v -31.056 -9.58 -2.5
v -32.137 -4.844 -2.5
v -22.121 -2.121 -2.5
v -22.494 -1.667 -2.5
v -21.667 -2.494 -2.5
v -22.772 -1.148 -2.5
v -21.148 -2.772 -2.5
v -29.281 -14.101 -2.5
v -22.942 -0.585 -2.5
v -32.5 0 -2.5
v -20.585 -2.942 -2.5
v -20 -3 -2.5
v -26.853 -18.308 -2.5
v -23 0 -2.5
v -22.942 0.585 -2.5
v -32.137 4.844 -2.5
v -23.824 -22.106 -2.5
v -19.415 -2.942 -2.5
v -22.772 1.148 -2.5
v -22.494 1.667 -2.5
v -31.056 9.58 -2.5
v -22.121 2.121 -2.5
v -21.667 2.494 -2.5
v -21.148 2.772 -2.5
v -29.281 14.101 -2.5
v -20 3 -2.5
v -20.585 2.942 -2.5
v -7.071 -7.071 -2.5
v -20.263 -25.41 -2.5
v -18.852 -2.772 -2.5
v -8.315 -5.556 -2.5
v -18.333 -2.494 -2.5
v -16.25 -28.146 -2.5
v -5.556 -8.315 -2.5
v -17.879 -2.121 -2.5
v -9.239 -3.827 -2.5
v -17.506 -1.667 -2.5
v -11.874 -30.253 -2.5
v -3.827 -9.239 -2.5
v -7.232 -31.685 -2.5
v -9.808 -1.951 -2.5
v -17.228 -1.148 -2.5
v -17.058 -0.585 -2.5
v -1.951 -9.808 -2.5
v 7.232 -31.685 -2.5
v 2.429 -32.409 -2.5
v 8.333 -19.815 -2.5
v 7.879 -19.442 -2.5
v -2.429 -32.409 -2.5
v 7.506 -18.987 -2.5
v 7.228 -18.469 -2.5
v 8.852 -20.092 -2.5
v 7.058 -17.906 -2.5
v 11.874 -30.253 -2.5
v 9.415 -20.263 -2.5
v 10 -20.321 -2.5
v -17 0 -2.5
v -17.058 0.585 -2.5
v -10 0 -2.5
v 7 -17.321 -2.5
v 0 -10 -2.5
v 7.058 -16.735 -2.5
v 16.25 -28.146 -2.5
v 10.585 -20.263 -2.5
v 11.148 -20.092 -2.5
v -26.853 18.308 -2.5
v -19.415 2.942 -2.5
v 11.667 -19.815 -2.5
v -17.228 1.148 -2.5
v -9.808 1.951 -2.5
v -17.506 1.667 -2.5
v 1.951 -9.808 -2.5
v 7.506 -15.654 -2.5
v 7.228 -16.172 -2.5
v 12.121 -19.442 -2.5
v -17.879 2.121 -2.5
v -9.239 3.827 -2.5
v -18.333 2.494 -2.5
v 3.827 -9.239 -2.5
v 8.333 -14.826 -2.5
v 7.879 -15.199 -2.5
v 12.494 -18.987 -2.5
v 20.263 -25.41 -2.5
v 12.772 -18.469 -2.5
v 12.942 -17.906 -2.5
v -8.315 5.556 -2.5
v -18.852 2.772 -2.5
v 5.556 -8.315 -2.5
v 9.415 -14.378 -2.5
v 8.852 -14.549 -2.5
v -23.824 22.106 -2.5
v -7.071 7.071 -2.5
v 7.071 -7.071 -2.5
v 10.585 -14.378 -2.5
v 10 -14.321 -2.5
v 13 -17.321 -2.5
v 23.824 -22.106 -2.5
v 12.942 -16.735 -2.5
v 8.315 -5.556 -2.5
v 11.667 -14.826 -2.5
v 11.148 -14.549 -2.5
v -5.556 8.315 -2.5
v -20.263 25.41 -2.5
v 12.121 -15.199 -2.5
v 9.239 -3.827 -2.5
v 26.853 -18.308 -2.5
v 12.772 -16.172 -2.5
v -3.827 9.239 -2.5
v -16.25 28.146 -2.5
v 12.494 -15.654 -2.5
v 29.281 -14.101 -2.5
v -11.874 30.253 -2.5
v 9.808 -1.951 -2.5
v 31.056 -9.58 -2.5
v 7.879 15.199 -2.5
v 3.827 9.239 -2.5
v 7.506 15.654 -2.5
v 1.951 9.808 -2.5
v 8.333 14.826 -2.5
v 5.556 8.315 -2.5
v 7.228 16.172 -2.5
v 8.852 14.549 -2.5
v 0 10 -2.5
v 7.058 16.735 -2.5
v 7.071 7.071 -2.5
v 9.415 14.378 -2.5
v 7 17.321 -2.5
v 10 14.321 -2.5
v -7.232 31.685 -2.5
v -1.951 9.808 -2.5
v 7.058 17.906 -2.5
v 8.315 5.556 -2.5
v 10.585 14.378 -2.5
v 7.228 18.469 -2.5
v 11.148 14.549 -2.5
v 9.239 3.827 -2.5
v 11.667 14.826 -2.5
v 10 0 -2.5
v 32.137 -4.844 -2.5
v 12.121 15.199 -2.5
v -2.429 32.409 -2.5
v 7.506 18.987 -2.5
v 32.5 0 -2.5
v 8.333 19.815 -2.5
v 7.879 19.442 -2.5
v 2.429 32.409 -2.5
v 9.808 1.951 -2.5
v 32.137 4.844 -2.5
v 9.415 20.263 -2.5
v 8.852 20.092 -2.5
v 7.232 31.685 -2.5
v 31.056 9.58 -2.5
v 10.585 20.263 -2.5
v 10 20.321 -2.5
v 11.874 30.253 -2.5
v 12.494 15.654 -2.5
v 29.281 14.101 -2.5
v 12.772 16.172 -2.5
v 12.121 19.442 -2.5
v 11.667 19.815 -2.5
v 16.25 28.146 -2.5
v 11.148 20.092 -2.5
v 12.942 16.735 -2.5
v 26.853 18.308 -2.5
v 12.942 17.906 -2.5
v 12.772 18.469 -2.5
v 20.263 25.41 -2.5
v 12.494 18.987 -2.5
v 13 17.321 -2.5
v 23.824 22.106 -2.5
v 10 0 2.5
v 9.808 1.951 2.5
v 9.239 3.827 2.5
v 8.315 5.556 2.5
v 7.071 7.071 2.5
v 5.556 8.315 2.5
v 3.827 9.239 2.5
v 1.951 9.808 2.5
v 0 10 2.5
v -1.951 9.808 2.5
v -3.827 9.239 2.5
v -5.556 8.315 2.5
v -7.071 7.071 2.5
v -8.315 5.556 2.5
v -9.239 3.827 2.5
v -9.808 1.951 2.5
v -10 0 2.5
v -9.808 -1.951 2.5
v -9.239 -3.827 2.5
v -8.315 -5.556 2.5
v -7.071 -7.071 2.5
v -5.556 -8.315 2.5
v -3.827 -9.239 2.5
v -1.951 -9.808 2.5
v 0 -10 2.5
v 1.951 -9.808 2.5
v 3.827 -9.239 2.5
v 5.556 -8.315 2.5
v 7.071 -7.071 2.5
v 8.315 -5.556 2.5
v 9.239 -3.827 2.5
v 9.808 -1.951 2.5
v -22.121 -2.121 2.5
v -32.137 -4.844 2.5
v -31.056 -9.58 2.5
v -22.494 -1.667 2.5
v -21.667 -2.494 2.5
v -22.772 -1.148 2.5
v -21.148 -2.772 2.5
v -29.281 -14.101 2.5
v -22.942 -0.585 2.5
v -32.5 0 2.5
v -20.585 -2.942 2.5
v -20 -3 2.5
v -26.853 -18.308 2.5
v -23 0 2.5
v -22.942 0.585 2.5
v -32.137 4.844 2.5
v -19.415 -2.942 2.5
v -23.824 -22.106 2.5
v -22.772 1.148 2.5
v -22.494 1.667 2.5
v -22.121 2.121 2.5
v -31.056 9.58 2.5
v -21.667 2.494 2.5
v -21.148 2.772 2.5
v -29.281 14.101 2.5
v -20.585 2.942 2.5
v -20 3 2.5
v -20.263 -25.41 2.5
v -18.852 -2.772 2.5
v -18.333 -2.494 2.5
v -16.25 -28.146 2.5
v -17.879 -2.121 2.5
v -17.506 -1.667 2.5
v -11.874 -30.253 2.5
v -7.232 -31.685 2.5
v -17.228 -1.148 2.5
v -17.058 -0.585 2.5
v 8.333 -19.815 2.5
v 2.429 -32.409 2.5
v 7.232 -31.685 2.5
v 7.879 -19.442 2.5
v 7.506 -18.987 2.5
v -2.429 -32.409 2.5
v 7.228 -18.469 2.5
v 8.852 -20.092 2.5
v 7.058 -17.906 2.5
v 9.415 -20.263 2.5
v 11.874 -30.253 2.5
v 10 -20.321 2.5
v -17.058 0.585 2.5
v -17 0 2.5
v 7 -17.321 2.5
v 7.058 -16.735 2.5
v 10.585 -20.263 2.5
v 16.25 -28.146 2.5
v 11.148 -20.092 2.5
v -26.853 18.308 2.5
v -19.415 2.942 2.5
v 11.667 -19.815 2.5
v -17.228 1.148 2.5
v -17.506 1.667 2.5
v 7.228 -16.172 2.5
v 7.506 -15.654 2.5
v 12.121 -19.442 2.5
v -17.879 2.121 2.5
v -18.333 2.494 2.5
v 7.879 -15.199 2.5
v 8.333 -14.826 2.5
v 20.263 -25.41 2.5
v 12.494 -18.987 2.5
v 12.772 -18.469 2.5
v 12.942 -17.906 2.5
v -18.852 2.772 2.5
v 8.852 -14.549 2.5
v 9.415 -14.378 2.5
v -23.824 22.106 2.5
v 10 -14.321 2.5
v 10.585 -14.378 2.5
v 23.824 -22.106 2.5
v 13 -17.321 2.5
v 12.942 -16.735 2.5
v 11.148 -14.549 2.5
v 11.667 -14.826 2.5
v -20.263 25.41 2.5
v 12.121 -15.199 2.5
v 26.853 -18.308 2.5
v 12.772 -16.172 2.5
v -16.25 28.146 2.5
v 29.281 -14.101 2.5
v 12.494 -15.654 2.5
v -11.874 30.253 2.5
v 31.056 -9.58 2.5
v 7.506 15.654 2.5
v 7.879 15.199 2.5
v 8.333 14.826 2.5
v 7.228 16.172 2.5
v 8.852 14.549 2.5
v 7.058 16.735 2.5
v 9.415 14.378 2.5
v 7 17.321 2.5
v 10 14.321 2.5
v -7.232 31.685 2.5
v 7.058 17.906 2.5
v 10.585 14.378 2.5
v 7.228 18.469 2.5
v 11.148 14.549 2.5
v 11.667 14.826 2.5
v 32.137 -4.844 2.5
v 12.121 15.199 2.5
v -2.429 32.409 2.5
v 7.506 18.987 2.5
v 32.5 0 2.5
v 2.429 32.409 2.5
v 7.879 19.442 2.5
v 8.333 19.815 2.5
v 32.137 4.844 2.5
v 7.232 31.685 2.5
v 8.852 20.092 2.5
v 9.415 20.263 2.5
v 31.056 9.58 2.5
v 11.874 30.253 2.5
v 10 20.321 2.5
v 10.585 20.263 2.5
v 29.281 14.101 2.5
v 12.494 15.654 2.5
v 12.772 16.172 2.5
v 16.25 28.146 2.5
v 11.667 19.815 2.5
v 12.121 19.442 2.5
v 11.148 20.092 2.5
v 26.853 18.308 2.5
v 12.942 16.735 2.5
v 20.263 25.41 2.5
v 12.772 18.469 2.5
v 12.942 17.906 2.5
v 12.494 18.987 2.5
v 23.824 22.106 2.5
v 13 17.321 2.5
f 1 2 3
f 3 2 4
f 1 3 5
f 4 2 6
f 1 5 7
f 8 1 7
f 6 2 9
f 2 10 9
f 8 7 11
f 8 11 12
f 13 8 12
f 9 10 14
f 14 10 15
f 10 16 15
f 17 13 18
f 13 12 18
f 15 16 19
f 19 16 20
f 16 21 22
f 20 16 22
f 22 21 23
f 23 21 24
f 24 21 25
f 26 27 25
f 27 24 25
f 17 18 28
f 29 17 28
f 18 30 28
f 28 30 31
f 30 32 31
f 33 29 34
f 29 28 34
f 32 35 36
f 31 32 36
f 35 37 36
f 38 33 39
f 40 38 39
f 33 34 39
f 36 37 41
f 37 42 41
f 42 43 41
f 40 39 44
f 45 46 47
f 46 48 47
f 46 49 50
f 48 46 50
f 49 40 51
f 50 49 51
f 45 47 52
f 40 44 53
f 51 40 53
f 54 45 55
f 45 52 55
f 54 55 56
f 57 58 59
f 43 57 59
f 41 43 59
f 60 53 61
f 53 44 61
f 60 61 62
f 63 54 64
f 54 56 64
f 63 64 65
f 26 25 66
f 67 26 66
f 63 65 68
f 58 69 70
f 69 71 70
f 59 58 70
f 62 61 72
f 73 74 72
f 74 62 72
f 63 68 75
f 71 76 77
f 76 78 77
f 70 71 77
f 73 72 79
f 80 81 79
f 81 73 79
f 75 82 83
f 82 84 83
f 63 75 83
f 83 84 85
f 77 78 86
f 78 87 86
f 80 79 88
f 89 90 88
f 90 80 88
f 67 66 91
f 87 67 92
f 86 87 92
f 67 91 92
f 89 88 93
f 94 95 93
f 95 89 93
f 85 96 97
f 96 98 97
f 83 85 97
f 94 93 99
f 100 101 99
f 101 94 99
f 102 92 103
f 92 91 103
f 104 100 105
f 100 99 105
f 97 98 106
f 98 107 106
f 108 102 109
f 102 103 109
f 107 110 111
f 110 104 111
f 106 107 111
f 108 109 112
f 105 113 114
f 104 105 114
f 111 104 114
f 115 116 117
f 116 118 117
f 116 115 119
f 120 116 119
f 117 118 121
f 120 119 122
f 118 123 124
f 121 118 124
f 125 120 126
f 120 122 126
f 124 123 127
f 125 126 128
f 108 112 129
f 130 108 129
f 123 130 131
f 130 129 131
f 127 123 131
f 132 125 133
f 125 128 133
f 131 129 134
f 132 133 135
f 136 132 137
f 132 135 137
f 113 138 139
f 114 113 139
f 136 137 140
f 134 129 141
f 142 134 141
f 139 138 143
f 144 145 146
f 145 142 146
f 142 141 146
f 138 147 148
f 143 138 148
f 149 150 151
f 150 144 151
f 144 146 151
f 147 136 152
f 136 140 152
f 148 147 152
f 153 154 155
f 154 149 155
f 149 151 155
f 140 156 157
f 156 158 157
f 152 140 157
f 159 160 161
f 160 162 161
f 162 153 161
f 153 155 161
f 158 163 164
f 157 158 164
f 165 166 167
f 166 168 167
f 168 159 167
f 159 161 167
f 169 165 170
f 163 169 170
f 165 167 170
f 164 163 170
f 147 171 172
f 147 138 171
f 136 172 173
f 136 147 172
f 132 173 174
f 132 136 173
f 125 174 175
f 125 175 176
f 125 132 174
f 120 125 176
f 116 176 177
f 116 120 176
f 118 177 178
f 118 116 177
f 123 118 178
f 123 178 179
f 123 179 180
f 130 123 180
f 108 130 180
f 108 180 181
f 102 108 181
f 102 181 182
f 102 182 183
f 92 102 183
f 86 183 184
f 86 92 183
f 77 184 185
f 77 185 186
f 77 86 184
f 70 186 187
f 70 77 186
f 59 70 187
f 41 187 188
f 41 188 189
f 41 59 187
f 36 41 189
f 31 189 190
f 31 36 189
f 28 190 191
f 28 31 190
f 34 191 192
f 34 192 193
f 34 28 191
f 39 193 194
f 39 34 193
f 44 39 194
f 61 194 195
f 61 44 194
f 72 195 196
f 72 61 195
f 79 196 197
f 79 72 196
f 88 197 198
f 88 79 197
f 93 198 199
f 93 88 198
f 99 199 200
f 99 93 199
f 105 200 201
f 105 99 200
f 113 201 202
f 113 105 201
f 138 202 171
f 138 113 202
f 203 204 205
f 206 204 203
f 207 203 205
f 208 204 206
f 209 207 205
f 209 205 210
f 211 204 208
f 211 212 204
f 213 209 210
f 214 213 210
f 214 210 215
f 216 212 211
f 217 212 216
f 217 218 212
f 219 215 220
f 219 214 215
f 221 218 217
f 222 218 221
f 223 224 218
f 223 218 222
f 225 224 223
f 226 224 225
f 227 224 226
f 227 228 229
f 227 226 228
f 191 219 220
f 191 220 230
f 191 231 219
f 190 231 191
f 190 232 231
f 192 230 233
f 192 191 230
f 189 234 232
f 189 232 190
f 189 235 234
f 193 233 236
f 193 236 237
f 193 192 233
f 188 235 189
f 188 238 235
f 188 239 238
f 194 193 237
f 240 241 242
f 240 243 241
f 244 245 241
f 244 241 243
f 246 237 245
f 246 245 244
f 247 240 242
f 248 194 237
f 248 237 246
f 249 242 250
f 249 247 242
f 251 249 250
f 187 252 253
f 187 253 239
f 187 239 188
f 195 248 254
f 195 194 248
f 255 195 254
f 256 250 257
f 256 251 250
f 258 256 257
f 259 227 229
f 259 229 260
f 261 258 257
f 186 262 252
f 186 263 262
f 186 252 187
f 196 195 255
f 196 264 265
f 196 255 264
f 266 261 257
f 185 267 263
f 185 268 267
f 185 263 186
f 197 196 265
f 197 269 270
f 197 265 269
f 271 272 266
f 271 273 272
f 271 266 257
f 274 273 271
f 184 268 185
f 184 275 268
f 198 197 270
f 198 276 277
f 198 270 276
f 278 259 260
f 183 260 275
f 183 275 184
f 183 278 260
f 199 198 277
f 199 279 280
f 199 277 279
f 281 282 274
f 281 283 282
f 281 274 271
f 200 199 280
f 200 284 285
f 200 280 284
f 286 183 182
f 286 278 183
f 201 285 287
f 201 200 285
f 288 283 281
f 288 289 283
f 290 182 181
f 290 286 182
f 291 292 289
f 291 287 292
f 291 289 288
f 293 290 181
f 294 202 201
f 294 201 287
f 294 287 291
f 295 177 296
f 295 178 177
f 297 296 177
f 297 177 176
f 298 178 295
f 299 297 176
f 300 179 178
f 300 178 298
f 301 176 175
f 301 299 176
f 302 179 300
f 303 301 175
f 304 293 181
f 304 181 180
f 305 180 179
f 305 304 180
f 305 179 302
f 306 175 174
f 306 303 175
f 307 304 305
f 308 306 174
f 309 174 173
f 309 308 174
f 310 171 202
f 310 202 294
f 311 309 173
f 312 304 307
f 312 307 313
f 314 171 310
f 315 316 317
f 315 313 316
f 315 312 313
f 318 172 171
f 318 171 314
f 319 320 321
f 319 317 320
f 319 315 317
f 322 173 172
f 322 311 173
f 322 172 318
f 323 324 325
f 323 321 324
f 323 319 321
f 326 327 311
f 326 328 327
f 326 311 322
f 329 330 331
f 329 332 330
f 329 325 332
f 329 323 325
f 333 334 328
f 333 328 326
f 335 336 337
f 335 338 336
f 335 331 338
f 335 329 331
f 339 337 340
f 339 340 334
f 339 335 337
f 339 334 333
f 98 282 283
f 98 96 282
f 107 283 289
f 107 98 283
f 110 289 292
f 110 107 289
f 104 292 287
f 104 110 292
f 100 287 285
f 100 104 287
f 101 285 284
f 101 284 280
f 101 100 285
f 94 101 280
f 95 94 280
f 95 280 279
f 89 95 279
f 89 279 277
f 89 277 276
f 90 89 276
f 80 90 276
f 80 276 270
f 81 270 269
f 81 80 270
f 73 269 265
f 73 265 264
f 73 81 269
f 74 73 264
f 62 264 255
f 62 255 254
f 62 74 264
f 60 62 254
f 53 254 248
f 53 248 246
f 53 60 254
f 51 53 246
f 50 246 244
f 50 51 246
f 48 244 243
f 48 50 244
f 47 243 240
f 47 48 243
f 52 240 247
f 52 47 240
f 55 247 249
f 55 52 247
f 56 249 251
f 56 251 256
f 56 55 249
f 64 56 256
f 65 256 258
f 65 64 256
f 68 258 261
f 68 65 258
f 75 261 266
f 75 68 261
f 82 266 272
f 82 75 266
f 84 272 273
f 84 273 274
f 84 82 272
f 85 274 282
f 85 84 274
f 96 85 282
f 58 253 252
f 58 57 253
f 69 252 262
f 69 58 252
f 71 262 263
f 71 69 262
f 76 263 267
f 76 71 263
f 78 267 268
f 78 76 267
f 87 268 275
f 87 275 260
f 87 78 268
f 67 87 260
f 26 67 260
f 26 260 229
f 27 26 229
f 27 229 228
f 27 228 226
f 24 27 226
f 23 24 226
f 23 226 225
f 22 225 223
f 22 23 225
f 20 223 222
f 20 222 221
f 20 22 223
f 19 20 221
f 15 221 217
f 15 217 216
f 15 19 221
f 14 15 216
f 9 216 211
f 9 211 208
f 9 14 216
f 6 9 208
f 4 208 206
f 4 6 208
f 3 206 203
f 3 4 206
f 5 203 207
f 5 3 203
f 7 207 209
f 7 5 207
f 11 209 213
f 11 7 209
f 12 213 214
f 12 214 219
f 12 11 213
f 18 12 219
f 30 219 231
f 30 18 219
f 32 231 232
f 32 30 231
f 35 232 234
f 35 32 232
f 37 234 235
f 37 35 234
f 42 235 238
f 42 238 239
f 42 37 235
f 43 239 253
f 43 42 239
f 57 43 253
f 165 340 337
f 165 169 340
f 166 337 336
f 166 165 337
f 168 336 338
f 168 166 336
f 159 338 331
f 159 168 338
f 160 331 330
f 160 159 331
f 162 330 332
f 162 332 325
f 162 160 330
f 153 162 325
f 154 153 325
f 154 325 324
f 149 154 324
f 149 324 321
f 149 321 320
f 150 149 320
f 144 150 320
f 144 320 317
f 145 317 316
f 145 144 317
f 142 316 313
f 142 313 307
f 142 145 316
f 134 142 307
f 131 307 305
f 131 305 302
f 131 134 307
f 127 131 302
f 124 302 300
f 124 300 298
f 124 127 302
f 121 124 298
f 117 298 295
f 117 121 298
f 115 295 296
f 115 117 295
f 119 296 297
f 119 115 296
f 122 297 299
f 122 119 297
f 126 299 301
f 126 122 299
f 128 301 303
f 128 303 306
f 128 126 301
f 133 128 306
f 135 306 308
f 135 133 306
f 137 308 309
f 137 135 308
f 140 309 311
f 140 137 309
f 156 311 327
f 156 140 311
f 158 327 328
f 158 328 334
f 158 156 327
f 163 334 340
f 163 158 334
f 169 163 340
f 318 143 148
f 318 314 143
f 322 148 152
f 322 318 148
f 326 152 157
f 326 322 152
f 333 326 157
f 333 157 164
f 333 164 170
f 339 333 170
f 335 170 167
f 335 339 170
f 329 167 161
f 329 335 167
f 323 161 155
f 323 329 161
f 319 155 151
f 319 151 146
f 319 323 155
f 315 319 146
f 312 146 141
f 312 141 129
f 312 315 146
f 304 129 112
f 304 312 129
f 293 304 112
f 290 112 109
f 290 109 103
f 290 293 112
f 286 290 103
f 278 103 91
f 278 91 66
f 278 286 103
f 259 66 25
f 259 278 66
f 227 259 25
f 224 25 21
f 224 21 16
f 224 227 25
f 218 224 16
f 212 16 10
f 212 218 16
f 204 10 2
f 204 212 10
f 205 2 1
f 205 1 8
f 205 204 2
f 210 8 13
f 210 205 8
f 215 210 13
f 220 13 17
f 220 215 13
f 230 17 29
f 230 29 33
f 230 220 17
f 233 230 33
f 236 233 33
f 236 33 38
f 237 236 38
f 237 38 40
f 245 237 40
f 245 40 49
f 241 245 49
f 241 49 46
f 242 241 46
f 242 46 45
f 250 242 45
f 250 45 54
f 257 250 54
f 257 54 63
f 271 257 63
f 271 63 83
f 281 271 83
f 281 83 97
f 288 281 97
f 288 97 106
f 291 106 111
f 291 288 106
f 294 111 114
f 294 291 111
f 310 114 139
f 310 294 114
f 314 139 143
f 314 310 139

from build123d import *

# Parameters (mm, degrees)
SKETCH1_R           = 32.5
SKETCH1_R_2         = 10
SKETCH1_R_3         = 3
BOSS_EXTRUDE1_DEPTH = 2.5


with BuildPart() as part:
    # Sketch1 → Boss-Extrude1 (new, symmetric)
    with BuildSketch(Plane(origin=(0, 0, 0), x_dir=(0, 1, 0), z_dir=(0, 0, 1))):
        with Locations(Location((0, 0, 0), (0, 0, 270))):
            Circle(SKETCH1_R)
        with Locations(Location((0, 0, 0), (0, 0, 270))):
            Circle(SKETCH1_R_2, mode=Mode.SUBTRACT)
        with Locations(Location((0, 20, 0), (0, 0, 270))):
            Circle(SKETCH1_R_3, mode=Mode.SUBTRACT)
        with Locations(Location((17.320508076, -10, 0), (0, 0, 270))):
            Circle(SKETCH1_R_3, mode=Mode.SUBTRACT)
        with Locations(Location((-17.320508076, -10, 0), (0, 0, 270))):
            Circle(SKETCH1_R_3, mode=Mode.SUBTRACT)
    extrude(amount=BOSS_EXTRUDE1_DEPTH, both=True)


solid = part.part
